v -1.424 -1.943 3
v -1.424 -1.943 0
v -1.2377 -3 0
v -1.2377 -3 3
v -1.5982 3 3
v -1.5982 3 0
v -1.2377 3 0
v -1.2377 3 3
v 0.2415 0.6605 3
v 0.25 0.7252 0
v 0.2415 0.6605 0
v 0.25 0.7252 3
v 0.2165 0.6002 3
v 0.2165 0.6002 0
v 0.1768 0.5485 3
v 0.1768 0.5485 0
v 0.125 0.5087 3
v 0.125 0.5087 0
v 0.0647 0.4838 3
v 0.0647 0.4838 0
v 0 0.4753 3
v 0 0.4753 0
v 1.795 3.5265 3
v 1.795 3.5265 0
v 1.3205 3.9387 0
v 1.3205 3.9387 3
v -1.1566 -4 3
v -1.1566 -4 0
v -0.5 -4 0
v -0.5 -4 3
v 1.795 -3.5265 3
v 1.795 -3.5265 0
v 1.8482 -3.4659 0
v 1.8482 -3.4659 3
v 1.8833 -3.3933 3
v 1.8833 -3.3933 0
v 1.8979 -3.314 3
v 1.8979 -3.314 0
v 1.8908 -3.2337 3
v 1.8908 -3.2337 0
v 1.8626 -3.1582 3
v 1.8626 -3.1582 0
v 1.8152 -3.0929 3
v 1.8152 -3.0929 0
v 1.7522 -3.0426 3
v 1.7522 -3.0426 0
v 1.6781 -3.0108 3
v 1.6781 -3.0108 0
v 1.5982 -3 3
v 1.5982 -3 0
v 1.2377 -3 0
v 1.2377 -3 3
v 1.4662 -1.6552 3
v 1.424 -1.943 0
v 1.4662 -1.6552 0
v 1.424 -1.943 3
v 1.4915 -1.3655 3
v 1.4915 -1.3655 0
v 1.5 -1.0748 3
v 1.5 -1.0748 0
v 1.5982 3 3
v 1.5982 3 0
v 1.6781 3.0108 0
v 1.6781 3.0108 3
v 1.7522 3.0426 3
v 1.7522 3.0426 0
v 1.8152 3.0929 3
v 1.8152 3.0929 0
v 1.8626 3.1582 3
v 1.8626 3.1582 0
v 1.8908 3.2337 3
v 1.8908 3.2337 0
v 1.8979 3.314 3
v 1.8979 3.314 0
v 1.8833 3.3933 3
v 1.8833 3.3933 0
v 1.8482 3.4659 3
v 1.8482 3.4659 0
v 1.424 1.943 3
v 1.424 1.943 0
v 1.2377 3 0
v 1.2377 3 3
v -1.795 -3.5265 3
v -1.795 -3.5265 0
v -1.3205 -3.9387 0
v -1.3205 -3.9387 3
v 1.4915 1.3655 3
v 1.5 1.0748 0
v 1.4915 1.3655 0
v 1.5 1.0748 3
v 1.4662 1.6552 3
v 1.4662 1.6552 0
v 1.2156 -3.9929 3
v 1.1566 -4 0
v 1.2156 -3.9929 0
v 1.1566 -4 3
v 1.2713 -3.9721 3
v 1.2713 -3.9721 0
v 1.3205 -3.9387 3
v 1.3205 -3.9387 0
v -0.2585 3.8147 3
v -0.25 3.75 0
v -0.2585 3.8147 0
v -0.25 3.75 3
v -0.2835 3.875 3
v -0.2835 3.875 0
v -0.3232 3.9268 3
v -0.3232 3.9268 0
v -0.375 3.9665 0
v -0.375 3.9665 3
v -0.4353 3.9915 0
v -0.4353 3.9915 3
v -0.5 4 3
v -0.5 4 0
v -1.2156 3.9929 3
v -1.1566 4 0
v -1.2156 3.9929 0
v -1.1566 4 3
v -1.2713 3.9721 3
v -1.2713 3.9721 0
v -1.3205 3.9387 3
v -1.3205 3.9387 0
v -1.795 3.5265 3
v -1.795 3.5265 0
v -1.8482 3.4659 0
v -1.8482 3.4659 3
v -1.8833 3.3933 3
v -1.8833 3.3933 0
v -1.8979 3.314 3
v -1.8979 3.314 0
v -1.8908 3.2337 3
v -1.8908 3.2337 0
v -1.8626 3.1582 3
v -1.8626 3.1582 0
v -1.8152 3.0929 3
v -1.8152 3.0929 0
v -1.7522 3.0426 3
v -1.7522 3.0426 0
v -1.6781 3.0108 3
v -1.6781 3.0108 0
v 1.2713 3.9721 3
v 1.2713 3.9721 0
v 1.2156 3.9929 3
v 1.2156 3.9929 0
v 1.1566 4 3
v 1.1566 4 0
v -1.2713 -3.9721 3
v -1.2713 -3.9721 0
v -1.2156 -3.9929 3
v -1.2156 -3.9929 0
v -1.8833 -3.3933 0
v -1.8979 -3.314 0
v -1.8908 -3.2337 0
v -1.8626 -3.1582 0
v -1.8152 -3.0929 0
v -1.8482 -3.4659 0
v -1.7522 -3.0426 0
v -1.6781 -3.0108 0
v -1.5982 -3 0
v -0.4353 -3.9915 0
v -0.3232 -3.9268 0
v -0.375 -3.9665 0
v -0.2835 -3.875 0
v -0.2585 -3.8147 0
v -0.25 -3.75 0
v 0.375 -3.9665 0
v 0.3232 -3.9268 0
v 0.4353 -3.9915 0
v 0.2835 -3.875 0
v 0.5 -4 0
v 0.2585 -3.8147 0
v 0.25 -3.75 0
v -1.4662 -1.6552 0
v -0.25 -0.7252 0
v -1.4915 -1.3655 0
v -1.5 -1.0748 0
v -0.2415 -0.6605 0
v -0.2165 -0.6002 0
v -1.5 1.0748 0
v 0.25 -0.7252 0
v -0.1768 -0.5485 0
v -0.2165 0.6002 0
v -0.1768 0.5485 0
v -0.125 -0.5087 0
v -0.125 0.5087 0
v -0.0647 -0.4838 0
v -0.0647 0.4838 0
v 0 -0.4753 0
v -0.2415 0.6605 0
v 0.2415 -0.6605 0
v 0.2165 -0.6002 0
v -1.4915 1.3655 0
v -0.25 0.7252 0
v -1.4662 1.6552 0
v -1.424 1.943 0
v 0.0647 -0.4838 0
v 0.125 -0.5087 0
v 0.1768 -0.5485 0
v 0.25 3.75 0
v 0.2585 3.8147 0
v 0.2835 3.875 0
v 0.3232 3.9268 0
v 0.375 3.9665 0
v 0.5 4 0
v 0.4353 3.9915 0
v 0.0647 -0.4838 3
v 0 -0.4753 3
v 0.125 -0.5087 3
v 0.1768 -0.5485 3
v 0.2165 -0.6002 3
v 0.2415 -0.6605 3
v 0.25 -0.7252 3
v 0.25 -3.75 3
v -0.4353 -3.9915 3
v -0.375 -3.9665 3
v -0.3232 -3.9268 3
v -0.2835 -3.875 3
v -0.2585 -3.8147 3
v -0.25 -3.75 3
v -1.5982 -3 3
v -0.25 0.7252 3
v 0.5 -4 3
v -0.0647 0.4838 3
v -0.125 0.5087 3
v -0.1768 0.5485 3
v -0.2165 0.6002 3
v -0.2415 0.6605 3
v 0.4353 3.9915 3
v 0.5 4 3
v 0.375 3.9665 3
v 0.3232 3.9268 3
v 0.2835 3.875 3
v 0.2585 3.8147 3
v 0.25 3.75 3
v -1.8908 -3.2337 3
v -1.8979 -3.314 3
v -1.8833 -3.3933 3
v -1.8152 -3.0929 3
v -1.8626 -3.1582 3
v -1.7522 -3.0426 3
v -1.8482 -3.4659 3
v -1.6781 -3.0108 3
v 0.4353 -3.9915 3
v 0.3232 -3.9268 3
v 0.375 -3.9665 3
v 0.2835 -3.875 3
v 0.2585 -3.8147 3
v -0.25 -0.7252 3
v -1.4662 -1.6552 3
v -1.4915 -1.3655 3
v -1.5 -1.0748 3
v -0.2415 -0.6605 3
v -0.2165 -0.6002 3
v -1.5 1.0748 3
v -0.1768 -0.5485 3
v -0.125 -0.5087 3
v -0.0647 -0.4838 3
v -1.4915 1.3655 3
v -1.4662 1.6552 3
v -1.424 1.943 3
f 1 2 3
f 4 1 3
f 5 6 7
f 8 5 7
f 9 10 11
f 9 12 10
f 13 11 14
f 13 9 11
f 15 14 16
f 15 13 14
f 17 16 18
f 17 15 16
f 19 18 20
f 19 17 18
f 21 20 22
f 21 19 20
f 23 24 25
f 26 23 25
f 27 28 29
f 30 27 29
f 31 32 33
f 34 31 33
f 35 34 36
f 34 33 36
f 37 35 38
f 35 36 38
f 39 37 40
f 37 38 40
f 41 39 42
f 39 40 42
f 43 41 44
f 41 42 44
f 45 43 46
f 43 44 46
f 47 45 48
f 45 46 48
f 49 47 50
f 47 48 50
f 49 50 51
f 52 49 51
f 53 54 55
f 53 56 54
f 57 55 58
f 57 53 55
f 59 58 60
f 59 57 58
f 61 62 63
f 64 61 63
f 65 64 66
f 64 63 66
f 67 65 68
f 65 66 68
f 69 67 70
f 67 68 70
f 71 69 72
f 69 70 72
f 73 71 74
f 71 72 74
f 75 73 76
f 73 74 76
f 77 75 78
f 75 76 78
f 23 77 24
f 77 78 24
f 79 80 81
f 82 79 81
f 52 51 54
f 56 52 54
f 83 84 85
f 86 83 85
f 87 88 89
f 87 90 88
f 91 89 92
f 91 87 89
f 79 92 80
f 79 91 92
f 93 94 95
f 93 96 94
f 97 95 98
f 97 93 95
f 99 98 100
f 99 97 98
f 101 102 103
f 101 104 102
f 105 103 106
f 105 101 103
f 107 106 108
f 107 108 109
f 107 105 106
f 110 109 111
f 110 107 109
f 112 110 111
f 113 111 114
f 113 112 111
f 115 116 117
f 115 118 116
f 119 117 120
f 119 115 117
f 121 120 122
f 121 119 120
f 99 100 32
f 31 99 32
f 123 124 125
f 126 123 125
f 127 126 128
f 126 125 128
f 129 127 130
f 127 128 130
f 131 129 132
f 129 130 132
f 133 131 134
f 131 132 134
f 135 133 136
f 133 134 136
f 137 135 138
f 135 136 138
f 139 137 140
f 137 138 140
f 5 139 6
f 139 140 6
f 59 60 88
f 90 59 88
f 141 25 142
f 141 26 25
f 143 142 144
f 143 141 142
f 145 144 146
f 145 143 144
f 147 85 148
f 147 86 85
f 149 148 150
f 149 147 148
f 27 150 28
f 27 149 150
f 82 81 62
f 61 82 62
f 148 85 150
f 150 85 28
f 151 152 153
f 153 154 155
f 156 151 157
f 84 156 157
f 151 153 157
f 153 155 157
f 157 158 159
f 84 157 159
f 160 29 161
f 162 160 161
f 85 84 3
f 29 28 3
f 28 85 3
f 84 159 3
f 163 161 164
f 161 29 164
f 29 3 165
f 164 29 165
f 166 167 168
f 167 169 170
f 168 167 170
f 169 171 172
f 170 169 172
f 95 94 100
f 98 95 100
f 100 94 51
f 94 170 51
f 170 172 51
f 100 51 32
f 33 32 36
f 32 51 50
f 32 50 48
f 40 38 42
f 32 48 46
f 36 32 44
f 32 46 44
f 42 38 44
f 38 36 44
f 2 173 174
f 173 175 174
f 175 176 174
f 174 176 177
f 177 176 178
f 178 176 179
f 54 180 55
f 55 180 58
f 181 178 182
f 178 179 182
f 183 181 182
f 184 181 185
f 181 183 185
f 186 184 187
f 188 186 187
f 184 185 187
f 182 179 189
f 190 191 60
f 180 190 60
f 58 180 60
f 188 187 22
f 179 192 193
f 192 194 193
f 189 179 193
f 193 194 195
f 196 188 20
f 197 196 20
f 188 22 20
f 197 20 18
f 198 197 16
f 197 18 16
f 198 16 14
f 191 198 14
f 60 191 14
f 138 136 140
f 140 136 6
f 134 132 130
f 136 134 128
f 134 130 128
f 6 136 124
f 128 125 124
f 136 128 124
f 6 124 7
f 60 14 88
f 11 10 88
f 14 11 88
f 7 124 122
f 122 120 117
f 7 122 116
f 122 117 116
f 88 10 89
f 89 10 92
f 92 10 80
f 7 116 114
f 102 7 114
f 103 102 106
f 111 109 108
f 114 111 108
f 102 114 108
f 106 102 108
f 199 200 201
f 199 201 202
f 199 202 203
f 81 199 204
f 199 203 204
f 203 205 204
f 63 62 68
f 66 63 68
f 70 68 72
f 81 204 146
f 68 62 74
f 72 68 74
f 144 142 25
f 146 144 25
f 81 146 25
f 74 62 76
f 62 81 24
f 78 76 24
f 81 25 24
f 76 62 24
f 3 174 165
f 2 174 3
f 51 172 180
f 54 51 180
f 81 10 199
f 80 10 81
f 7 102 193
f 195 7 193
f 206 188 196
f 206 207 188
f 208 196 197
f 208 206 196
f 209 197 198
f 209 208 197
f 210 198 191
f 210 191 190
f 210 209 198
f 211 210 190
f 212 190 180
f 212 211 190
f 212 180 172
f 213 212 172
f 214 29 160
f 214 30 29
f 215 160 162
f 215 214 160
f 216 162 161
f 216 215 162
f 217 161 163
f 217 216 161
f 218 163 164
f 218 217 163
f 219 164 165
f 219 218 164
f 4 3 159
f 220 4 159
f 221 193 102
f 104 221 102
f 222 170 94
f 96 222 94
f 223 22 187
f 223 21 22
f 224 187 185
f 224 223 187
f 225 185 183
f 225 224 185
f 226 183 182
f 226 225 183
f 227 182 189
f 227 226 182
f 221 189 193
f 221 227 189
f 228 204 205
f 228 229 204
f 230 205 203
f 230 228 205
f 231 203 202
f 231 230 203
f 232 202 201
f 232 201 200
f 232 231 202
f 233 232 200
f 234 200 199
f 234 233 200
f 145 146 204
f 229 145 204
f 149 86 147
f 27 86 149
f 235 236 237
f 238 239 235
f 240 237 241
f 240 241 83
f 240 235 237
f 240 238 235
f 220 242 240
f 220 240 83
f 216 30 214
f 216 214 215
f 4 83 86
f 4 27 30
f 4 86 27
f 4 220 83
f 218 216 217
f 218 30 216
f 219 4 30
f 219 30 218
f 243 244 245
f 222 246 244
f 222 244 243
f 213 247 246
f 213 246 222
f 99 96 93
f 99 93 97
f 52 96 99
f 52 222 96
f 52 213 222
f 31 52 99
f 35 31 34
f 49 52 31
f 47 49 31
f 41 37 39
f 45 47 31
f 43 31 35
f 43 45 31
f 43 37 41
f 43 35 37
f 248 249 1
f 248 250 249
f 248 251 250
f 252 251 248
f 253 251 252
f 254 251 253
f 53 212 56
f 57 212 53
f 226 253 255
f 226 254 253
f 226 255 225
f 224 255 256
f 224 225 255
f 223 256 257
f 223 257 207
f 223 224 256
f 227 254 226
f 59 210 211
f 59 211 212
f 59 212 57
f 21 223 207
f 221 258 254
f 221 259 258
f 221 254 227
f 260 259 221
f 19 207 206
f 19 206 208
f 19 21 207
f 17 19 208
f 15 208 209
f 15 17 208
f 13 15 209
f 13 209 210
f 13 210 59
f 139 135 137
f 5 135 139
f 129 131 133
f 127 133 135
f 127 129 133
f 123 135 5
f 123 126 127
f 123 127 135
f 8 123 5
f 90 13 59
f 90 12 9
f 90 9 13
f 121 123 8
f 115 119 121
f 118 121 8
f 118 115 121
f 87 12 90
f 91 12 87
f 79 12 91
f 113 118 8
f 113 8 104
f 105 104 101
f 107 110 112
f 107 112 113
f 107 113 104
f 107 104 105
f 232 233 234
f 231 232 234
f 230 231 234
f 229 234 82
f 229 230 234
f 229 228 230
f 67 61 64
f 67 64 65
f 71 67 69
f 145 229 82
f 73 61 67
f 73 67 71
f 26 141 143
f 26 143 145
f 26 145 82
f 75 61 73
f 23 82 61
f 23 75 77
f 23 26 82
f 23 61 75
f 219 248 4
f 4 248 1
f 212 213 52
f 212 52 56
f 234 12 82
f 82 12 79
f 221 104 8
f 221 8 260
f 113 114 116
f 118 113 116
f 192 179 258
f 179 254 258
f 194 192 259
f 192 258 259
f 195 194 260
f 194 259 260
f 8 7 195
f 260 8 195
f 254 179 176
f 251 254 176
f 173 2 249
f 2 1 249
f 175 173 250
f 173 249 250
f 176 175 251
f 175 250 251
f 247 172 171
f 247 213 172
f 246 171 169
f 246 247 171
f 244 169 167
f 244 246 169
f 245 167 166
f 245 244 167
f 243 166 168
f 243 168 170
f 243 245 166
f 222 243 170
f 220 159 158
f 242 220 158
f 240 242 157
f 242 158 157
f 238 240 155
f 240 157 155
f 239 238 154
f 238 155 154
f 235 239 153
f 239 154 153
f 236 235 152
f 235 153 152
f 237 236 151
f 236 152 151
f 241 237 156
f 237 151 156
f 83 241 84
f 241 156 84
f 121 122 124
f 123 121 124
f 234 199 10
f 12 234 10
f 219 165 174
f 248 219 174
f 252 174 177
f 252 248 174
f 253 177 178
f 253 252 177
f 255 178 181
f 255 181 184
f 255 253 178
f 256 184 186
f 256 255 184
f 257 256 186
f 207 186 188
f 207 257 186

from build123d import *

# Parameters (mm, degrees)
F1_DEPTH = 3
F2_R     = 0.24999
F3_R     = 5


# Not quite as in the source:
# - a fillet or chamfer is up to 0.001 mm smaller than in the source, because OpenCascade refuses the exact size


with BuildPart() as f1:
    # F0 (on Top) → F1 (new body)
    with BuildSketch(Plane.XY):
        with BuildLine():
            Line((-1.5, 1.5121936516), (-1.5, 0))
            Line((-1.5, 0), (-1.5, -1.5121936516))
            Line((-1.5, -1.5121936516), (-1.2376595987, -3))
            Line((-1.2376595987, -3), (-1.5982141028, -3))
            ThreePointArc((-1.5982141028, -3), (-1.8792268389, -3.1949674233), (-1.7949840479, -3.5264543855))
            Line((-1.7949840479, -3.5264543855), (-1.25, -4))
            Line((-1.25, -4), (-0.25, -4))
            Line((-0.25, -4), (-0.25, -0.4752505826))
            Line((-0.25, -0.4752505826), (0, -0.4752505826))
            Line((0, -0.4752505826), (0.25, -0.4752505826))
            Line((0.25, -0.4752505826), (0.25, -4))
            Line((0.25, -4), (1.25, -4))
            Line((1.25, -4), (1.7949840479, -3.5264543855))
            ThreePointArc((1.7949840479, -3.5264543855), (1.8792268389, -3.1949674233), (1.5982141028, -3))
            Line((1.5982141028, -3), (1.2376595987, -3))
            Line((1.2376595987, -3), (1.5, -1.5121936516))
            Line((1.5, -1.5121936516), (1.5, 1.5121936516))
            Line((1.5, 1.5121936516), (1.2376595987, 3))
            Line((1.2376595987, 3), (1.5982141028, 3))
            ThreePointArc((1.5982141028, 3), (1.8792268389, 3.1949674233), (1.7949840479, 3.5264543855))
            Line((1.7949840479, 3.5264543855), (1.25, 4))
            Line((1.25, 4), (0.25, 4))
            Line((0.25, 4), (0.25, 0.4752505826))
            Line((0.25, 0.4752505826), (0, 0.4752505826))
            Line((0, 0.4752505826), (-0.25, 0.4752505826))
            Line((-0.25, 0.4752505826), (-0.25, 4))
            Line((-0.25, 4), (-1.25, 4))
            Line((-1.25, 4), (-1.7949840479, 3.5264543855))
            ThreePointArc((-1.7949840479, 3.5264543855), (-1.8792268389, 3.1949674233), (-1.5982141028, 3))
            Line((-1.5982141028, 3), (-1.2376595987, 3))
            Line((-1.2376595987, 3), (-1.5, 1.5121936516))
        make_face()
    extrude(amount=F1_DEPTH)

    # F2 (radius 0.25 in the source; OpenCascade refuses exactly that, so slightly less here)
    f2_edges = [f1.edges().sort_by_distance(p)[0] for p in [
        (-1.25, 4, 1.5),
        (-0.25, 4, 1.5),
        (0.25, 4, 1.5),
        (1.25, 4, 1.5),
        (-0.25, 0.475251, 1.5),
        (0.25, 0.475251, 1.5),
        (-0.25, -0.475251, 1.5),
        (0.25, -0.475251, 1.5),
        (-1.25, -4, 1.5),
        (-0.25, -4, 1.5),
        (0.25, -4, 1.5),
        (1.25, -4, 1.5),
    ]]
    fillet(f2_edges, radius=F2_R)

    # F3
    f3_edges = [f1.edges().sort_by_distance(p)[0] for p in [
        (-1.5, -1.512194, 1.5),
        (-1.5, 1.512194, 1.5),
        (1.5, -1.512194, 1.5),
        (1.5, 1.512194, 1.5),
    ]]
    fillet(f3_edges, radius=F3_R)


solid = f1.part
